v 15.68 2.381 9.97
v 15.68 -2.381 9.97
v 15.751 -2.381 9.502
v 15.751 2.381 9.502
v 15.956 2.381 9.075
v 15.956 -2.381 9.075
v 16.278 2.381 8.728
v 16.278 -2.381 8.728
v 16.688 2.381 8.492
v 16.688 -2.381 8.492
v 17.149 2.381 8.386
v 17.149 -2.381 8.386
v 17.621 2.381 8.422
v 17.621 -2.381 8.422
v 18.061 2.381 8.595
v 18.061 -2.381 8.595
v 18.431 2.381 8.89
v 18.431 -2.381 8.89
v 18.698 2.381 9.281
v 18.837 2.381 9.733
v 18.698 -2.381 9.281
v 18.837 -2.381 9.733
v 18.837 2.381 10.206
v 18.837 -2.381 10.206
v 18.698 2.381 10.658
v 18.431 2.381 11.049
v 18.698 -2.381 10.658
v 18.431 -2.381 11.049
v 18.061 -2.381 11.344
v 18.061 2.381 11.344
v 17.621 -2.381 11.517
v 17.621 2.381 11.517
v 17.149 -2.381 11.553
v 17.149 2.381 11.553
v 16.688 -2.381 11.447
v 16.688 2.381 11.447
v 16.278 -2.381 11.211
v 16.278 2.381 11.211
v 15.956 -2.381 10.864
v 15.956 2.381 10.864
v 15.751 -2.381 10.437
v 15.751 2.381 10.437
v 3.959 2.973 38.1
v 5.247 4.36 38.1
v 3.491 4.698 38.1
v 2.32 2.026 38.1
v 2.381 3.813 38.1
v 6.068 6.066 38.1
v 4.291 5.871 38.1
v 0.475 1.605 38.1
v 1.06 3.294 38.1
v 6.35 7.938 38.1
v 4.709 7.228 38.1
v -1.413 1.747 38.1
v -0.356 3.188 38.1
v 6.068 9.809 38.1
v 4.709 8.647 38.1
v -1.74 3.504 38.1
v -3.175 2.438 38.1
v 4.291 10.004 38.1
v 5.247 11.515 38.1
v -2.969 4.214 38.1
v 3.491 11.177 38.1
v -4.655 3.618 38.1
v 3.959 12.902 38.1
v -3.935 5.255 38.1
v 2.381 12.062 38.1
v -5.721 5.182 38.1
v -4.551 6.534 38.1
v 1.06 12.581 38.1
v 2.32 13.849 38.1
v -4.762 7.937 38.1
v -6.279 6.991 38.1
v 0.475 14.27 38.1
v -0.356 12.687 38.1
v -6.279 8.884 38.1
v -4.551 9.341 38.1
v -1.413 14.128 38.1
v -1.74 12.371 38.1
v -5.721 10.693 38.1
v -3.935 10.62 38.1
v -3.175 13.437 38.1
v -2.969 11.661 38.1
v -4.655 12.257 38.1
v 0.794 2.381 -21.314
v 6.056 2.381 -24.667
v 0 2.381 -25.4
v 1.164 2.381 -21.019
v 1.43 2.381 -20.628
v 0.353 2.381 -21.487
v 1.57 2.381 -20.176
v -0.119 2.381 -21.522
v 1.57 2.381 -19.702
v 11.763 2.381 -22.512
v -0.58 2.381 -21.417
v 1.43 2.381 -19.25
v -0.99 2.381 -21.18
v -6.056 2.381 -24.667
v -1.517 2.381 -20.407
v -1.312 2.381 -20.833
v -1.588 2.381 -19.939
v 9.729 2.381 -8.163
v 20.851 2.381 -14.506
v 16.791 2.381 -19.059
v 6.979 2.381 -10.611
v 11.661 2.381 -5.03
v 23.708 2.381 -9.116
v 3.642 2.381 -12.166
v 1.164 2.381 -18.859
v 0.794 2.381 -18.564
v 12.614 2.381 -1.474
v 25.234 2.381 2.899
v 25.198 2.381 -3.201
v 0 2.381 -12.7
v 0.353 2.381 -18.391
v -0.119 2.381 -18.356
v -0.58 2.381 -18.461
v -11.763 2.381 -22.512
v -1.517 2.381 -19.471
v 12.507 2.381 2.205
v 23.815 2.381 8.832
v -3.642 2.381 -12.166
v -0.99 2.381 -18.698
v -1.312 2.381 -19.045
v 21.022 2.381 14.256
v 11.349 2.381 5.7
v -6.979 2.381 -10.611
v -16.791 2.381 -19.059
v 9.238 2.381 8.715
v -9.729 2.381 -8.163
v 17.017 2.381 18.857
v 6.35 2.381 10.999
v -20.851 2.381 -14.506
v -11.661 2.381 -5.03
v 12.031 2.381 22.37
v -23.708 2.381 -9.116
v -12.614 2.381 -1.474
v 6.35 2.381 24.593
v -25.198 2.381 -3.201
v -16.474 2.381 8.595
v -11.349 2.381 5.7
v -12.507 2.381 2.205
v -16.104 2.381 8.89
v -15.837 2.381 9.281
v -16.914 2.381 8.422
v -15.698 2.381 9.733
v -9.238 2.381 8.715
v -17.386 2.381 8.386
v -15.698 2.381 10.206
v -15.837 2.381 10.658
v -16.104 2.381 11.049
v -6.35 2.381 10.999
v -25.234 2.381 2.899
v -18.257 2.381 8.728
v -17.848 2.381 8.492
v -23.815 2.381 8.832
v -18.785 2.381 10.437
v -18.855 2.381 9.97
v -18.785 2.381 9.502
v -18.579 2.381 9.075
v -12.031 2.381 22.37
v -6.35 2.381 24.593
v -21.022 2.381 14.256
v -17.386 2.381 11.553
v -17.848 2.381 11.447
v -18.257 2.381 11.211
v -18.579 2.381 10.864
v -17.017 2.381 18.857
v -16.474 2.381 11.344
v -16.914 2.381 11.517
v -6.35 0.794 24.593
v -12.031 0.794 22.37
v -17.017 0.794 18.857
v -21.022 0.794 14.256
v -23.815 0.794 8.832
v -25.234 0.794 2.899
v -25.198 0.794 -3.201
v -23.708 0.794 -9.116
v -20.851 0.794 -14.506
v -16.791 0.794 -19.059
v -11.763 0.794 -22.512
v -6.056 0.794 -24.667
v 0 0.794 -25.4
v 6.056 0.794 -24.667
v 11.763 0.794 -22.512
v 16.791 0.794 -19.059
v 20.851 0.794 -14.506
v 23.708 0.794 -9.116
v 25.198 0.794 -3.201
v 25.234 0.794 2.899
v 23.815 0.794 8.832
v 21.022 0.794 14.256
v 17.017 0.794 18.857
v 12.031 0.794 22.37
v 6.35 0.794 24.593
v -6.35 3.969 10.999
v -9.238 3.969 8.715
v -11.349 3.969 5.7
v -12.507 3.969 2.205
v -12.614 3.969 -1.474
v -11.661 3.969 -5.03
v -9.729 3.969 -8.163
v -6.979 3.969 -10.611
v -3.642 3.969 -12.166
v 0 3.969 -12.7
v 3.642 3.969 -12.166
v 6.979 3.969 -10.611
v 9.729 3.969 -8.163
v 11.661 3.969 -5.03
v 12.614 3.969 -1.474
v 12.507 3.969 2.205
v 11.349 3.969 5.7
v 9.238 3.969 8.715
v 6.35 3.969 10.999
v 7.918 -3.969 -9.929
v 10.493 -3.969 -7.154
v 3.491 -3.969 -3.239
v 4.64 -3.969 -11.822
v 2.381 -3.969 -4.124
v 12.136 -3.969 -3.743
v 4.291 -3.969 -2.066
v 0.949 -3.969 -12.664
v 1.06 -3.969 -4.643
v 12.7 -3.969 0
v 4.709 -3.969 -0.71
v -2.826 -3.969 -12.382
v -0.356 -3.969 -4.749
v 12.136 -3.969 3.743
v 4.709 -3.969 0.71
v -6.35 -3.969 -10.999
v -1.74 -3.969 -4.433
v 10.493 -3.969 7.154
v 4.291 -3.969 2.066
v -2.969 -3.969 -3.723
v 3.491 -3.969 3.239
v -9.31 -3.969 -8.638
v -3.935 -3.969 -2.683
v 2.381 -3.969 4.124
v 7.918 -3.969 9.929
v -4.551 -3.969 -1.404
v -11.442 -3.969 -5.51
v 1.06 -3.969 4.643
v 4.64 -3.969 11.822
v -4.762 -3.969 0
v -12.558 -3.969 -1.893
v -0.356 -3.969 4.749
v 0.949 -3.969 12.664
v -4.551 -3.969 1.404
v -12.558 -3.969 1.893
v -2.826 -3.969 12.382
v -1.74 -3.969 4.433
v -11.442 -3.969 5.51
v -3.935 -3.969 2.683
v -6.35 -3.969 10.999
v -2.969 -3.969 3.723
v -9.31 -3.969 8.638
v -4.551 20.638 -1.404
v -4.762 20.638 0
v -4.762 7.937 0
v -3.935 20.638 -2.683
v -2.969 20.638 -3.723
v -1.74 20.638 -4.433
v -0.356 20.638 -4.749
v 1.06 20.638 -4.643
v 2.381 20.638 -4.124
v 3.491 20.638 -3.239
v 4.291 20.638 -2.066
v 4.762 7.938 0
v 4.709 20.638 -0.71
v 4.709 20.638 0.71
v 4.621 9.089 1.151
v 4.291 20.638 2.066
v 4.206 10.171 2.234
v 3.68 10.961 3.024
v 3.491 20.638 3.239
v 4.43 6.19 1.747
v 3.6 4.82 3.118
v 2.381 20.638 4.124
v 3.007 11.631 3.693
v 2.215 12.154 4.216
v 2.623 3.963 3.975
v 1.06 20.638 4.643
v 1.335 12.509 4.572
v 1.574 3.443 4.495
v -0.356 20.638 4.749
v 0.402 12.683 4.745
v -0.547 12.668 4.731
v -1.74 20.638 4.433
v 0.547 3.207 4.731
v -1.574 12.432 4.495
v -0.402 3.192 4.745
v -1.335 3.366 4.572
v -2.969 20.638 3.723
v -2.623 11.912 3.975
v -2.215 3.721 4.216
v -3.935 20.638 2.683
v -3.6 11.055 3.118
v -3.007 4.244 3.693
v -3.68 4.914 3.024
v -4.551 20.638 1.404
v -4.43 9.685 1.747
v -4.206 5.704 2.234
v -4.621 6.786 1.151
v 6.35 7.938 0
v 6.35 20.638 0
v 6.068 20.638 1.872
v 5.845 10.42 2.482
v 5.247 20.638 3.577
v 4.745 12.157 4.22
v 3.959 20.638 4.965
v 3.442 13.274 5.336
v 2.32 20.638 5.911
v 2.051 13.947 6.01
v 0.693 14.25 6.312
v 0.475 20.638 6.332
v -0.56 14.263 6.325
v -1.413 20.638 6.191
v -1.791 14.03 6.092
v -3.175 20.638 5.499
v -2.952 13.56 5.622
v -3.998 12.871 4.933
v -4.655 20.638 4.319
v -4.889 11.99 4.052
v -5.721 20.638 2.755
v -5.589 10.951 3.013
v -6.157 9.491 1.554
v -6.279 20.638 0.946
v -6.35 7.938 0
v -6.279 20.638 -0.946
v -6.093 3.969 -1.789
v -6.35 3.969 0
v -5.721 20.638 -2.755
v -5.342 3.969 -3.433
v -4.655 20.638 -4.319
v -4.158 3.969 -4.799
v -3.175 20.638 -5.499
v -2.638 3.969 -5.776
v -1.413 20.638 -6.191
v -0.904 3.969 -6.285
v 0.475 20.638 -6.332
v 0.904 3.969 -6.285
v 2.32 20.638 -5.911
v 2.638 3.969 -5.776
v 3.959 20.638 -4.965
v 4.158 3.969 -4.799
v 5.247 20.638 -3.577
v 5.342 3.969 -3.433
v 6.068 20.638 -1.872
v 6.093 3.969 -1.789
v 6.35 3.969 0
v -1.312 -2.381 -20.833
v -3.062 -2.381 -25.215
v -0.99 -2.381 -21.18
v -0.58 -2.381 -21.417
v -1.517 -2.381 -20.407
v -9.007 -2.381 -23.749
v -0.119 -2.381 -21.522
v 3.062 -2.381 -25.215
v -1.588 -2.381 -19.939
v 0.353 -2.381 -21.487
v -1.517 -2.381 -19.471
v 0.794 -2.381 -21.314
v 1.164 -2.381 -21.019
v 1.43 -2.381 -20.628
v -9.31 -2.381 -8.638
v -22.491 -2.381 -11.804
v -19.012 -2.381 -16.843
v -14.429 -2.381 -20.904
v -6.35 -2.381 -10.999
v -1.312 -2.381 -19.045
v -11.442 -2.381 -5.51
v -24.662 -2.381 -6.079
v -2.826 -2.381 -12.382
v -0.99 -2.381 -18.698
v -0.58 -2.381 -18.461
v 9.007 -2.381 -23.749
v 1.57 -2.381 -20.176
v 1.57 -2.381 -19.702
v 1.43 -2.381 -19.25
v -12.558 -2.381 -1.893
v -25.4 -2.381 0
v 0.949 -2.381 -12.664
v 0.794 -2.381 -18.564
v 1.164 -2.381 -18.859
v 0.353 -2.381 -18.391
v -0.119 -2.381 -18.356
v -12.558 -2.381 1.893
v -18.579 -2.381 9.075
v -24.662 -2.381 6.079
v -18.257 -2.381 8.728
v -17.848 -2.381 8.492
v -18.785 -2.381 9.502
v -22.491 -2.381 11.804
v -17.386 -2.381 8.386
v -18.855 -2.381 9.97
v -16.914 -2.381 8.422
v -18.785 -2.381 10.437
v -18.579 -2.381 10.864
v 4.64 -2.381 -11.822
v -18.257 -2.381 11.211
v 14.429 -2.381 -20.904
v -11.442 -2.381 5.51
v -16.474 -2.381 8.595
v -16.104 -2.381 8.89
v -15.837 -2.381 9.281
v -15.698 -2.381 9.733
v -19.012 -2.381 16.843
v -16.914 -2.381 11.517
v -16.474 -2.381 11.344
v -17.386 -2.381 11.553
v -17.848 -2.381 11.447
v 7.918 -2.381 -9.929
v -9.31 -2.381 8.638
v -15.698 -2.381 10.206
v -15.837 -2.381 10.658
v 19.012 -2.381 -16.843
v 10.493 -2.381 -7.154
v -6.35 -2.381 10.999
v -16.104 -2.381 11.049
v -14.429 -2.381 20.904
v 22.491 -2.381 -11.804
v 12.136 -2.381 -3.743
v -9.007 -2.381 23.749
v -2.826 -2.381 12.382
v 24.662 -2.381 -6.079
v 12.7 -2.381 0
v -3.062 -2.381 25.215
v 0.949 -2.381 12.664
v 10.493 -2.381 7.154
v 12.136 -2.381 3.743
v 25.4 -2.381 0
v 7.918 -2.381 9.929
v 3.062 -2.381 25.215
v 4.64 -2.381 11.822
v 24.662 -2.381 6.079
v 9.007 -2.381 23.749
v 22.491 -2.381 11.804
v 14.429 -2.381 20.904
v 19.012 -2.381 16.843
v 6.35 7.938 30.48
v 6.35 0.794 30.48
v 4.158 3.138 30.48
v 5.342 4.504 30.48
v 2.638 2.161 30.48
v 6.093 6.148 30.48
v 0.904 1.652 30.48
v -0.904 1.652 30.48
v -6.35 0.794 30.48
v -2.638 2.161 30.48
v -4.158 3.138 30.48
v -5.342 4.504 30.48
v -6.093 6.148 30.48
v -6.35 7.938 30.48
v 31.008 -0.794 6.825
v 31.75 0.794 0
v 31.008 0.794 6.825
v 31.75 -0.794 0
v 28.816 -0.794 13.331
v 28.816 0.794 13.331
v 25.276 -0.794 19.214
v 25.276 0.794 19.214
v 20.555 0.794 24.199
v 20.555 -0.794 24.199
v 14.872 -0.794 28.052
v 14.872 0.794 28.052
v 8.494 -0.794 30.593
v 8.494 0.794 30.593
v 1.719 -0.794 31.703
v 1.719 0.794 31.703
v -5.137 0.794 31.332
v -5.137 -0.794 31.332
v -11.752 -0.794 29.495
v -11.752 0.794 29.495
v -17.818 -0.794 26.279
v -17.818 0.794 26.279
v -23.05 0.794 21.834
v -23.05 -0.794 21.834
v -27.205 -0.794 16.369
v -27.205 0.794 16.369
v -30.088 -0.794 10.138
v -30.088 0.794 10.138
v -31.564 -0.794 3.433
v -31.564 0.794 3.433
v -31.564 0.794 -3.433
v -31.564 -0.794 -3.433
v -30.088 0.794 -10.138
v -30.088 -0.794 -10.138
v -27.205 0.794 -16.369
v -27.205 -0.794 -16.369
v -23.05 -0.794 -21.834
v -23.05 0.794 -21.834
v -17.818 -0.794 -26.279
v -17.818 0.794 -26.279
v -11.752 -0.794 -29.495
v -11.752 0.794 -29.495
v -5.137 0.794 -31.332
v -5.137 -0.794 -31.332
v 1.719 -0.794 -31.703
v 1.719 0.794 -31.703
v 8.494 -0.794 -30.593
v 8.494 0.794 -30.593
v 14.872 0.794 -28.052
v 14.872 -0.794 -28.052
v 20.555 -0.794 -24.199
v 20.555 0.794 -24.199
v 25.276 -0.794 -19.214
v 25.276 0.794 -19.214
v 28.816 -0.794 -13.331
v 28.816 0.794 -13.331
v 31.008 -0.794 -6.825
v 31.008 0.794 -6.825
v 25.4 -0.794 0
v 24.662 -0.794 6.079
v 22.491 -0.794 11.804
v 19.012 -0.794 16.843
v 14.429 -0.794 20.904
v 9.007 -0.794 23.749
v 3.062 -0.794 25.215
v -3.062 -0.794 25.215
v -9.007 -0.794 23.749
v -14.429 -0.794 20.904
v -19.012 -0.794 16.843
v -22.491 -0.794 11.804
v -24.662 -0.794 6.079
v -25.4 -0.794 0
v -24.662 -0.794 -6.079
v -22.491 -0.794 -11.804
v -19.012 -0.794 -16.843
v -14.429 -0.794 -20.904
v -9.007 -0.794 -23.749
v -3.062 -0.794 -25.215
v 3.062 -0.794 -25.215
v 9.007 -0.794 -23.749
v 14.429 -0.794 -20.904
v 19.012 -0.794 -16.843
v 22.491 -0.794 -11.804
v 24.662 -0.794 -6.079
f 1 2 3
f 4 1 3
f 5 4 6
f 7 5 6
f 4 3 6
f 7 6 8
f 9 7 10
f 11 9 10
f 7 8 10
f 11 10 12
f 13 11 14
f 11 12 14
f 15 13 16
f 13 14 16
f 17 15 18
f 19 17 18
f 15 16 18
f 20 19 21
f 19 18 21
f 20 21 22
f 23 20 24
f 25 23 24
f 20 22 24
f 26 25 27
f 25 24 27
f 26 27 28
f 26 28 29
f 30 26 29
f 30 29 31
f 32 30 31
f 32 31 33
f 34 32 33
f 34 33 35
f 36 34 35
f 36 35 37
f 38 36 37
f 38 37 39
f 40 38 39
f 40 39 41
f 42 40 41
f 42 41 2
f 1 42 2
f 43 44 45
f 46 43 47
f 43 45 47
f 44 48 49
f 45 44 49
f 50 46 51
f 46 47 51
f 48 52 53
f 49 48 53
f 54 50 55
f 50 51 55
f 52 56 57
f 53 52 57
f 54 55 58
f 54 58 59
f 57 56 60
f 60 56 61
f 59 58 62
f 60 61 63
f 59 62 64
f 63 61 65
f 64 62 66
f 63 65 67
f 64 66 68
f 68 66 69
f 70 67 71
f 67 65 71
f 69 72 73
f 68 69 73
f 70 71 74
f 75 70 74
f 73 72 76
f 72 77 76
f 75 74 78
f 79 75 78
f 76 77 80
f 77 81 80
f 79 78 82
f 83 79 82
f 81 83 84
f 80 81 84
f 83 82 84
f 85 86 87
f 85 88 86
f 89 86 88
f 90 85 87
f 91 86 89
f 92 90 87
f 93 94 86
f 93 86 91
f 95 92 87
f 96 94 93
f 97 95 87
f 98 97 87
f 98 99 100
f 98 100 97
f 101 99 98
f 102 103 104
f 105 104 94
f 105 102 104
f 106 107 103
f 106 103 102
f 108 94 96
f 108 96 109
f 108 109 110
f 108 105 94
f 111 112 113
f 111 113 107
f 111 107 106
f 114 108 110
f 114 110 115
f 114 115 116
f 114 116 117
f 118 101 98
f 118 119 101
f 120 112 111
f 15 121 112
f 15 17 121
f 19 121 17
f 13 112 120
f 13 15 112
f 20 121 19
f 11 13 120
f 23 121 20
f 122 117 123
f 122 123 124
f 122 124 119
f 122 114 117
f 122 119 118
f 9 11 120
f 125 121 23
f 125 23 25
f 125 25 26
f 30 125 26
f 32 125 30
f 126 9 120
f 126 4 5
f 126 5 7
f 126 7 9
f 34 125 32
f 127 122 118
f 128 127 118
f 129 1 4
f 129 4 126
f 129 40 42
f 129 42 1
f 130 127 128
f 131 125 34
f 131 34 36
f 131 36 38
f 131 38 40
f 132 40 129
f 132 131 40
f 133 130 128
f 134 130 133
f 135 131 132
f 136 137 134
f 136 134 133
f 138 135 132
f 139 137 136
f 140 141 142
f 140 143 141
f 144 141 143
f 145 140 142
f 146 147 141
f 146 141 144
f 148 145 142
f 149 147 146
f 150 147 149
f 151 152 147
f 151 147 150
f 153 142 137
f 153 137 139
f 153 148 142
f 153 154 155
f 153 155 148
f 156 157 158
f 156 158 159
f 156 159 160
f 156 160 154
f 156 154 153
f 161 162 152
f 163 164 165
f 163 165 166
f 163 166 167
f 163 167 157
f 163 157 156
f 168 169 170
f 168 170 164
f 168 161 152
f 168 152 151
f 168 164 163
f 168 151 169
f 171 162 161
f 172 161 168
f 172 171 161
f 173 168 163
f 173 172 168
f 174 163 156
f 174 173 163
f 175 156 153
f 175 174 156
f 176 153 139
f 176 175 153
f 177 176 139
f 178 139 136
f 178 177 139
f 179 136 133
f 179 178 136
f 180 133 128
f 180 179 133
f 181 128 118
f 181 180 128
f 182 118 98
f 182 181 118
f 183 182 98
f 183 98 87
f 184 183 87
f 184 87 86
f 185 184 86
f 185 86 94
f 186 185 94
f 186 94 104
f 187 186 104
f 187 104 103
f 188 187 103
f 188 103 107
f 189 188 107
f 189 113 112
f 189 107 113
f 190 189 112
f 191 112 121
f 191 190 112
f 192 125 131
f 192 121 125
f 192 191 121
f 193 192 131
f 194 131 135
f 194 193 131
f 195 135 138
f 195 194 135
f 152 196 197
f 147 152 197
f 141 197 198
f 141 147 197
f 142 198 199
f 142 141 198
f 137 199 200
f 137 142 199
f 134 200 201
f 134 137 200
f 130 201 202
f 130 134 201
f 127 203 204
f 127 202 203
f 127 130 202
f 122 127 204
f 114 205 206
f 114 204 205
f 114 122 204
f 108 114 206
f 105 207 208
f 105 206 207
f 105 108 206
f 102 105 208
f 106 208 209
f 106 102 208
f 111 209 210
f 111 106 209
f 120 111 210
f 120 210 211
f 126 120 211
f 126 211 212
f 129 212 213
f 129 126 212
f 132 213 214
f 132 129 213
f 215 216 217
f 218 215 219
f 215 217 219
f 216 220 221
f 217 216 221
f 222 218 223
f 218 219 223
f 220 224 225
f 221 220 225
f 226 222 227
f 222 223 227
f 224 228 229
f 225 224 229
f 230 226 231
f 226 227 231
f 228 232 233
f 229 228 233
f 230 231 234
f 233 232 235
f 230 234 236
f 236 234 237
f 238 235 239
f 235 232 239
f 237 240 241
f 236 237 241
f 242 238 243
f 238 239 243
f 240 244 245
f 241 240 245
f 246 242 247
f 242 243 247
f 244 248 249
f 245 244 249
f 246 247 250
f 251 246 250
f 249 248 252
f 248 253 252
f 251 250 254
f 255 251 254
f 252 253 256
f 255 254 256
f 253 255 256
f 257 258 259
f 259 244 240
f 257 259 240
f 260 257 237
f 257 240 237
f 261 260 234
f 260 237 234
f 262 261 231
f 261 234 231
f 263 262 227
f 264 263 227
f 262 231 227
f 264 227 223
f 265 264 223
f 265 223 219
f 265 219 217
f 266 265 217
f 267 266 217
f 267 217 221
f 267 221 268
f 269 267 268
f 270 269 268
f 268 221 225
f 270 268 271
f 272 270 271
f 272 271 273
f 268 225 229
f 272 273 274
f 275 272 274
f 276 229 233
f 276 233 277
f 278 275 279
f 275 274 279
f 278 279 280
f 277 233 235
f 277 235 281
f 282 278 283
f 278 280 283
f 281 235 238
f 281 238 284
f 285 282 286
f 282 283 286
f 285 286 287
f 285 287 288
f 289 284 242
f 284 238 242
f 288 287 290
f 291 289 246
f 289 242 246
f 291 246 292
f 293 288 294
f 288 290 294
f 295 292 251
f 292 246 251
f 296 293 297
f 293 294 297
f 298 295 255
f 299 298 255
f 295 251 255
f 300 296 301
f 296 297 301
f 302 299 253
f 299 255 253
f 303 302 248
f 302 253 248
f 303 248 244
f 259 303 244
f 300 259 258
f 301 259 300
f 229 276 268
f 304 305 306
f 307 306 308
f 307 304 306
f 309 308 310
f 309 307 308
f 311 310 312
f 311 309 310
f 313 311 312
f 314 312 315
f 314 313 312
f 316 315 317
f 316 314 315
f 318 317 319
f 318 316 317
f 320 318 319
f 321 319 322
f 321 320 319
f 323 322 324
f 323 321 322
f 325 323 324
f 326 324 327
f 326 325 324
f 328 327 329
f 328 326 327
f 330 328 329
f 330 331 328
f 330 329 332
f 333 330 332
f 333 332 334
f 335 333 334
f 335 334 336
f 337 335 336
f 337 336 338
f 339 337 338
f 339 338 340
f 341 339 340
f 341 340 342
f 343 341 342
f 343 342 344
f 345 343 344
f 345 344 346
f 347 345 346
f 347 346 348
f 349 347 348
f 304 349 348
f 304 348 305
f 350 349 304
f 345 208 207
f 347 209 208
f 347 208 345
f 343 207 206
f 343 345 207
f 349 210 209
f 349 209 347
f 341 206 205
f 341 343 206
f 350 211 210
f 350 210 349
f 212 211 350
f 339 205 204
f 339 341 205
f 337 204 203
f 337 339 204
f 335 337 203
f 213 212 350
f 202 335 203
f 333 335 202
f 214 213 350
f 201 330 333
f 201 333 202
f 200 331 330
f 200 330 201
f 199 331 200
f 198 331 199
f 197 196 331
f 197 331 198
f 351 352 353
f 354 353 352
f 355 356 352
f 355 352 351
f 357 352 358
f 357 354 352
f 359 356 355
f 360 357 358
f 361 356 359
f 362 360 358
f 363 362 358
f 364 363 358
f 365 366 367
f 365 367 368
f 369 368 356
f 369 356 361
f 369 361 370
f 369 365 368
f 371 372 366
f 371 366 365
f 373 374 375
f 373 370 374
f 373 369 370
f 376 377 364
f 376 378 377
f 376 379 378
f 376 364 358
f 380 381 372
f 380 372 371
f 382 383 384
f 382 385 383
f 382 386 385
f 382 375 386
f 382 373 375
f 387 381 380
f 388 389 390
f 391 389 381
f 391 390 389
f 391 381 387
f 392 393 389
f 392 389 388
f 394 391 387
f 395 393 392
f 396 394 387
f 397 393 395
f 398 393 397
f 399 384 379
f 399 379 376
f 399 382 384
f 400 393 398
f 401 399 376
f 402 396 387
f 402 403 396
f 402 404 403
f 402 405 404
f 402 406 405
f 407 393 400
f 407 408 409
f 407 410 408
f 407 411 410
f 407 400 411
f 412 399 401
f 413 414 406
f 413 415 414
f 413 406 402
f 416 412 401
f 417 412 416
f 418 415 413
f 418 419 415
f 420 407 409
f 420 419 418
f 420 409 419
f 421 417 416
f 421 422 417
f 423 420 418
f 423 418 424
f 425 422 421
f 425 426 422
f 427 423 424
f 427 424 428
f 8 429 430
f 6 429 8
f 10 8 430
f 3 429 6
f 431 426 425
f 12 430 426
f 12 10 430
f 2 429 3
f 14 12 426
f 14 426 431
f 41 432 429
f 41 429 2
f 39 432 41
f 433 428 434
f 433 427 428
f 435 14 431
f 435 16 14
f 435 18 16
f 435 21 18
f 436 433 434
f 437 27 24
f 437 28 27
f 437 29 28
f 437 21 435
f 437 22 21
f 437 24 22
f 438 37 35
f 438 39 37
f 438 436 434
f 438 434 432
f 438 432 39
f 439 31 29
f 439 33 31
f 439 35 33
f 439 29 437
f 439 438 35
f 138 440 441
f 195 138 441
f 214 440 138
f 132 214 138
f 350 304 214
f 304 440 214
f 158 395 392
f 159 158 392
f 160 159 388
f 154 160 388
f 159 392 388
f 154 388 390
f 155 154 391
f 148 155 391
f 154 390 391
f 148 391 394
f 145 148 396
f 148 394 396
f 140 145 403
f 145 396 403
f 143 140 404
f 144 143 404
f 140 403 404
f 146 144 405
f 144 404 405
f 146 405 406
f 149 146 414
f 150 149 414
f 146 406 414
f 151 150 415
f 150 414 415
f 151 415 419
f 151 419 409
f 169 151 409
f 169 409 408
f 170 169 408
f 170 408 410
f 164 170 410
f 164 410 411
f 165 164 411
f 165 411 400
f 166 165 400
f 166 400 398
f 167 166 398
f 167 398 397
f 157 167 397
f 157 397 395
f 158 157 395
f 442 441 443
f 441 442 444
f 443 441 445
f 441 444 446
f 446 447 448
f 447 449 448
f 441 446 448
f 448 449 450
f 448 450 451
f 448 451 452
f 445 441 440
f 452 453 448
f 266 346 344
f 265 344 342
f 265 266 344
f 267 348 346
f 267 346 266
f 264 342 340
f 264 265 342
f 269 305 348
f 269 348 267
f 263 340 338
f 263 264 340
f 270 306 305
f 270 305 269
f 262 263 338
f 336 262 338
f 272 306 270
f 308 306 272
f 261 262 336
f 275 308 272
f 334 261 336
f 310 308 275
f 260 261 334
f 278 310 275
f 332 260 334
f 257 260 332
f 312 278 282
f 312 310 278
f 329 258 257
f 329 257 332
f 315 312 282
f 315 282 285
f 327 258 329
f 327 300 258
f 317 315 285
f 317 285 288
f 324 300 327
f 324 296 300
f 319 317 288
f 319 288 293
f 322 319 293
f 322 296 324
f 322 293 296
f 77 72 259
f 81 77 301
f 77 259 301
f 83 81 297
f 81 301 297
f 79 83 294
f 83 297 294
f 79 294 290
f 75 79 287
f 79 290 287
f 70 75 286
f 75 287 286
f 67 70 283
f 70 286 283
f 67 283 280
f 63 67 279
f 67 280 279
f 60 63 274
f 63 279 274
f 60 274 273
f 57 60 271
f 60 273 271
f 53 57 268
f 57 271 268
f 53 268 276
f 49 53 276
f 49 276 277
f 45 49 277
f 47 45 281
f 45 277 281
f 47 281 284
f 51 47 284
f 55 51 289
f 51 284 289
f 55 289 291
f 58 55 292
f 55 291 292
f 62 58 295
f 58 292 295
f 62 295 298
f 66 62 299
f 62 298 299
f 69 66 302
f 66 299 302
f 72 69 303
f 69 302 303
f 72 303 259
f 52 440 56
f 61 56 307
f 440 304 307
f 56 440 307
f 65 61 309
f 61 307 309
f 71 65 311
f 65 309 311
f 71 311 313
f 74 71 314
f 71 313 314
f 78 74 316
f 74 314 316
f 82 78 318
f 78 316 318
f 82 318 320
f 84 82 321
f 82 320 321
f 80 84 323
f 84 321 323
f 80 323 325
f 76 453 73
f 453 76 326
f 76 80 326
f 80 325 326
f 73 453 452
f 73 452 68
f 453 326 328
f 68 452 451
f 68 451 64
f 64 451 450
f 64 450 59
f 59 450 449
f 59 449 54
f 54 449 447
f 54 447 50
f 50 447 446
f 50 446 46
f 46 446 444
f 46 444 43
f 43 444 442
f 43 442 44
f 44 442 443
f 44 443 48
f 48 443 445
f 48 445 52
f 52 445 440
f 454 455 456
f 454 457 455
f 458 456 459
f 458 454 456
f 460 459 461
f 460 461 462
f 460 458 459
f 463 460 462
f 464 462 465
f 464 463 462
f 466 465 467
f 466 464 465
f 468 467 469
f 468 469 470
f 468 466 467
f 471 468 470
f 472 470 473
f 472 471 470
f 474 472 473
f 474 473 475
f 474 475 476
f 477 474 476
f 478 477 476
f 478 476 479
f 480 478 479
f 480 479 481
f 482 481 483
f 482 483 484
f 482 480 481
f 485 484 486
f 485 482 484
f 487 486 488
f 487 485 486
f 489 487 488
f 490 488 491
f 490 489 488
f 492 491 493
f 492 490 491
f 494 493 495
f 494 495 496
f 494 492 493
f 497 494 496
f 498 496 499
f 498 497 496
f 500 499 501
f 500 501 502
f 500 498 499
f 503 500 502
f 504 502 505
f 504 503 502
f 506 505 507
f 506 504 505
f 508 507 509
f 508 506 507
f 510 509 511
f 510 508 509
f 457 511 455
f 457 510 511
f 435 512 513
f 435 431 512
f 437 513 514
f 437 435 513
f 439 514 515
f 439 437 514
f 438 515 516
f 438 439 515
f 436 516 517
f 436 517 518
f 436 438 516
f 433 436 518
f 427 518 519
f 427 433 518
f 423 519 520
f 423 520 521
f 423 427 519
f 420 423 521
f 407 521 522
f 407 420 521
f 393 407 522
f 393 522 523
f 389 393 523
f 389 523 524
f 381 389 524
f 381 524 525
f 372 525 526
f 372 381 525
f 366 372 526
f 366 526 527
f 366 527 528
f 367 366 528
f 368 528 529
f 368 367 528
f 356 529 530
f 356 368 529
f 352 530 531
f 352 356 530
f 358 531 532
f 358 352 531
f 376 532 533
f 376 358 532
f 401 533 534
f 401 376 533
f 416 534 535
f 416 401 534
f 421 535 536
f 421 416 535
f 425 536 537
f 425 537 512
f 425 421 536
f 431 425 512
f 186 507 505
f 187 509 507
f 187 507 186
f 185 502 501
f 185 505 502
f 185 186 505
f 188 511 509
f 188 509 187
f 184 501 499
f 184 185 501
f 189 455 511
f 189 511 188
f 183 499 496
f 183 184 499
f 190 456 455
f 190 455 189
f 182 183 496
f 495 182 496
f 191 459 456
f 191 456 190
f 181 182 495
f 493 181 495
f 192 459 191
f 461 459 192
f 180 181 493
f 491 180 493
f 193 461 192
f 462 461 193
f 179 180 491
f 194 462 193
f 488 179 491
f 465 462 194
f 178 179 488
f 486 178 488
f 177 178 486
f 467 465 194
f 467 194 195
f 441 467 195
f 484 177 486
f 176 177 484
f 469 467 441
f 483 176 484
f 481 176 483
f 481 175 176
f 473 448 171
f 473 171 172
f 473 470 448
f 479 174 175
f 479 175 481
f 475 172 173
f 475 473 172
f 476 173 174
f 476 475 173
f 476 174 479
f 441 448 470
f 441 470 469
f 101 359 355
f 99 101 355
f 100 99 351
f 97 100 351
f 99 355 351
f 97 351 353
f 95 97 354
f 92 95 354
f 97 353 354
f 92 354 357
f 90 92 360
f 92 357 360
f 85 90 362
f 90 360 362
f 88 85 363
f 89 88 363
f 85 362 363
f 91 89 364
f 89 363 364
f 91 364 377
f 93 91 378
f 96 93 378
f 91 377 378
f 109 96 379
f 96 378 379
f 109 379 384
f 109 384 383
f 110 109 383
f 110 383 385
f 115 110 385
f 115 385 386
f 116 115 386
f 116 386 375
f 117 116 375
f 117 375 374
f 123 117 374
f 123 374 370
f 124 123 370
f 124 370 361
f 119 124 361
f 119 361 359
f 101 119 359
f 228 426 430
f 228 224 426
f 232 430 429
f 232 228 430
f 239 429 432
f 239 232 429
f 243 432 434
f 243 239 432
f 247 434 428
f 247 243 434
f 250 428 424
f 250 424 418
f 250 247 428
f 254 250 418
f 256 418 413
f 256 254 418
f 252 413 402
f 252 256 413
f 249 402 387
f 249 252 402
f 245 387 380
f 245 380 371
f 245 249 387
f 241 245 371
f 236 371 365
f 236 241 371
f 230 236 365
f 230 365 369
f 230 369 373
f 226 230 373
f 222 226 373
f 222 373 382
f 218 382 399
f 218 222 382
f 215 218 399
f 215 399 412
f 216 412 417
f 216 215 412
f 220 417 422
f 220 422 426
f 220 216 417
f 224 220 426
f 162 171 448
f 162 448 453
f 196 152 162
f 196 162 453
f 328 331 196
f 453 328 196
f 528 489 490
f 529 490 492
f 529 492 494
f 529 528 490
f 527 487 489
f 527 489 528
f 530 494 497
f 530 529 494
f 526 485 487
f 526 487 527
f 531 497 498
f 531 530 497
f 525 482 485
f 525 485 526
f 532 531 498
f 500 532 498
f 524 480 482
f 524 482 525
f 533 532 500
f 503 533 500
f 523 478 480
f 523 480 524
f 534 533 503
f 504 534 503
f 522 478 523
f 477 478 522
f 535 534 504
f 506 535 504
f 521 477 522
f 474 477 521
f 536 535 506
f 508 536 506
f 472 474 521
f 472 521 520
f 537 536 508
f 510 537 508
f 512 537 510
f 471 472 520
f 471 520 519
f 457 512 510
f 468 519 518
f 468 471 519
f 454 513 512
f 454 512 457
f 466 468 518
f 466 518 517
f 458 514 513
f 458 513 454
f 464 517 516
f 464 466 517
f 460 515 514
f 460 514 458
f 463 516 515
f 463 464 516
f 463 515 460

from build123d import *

# Parameters (mm, degrees)
SKETCH3_W           = 6.35
SKETCH3_H           = 38.1
EXTRUDE_THIN1_START = -30.48
EXTRUDE_THIN1_DEPTH = 30.48
HOLE1_D             = 9.525
HOLE1_DEPTH         = 38.1
HOLE2_D             = 9.525
HOLE3_D             = 3.175


with BuildPart() as part:
    # Sketch1 → Revolve1 (revolve)
    with BuildSketch(Plane.XY):
        Polygon((0, 20.6375), (6.35, 20.6375), (6.35, 3.96875), (12.7, 3.96875), (12.7, 2.38125), (25.4, 2.38125), (25.4, 0.79375), (31.75, 0.79375), (31.75, -0.79375), (25.4, -0.79375), (25.4, -2.38125), (12.7, -2.38125), (12.7, -3.96875), (6.35, -3.96875), (0, -3.96875), align=None)
    revolve(axis=Axis((0, 20.6375, 0), (0, -1, 0)))

    # Sketch3 → Revolve2 (revolve)
    with BuildSketch(Plane(origin=(0, 7.9375, 0), x_dir=(1, 0, 0), z_dir=(0, 1, 0))):
        with Locations((3.175, -19.05)):
            Rectangle(SKETCH3_W, SKETCH3_H)
    revolve(axis=Axis((0, 7.9375, 0), (0, 0, 1)))

    # Sketch4 → Extrude-Thin1 (add)
    with BuildSketch(Plane.XY.offset(30.48).offset(EXTRUDE_THIN1_START)):
        Polygon((6.35, 7.9375), (6.35, 0.79375), (-6.35, 0.79375), (-6.35, 7.9375), (-3.81, 7.9375), (-3.81, 3.33375), (3.81, 3.33375), (3.81, 7.9375), align=None)
    extrude(amount=EXTRUDE_THIN1_DEPTH)

    # Hole1
    with Locations(Plane.XY.offset(38.1)):
        with Locations((0, 7.9375)):
            Hole(HOLE1_D / 2, depth=HOLE1_DEPTH)

    # Hole2 (through all)
    with Locations(Plane(origin=(0, 20.6375, 0), x_dir=(1, 0, 0), z_dir=(0, 1, 0))):
        with Locations((0, 0)):
            Hole(HOLE2_D / 2)

    # Hole3 (through all)
    with Locations(Plane(origin=(0, 2.38125, 0), x_dir=(1, 0, 0), z_dir=(0, 1, 0))):
        with Locations((0, 19.939), (17.267680526, -9.9695), (-17.267680526, -9.9695)):
            Hole(HOLE3_D / 2)


solid = part.part
